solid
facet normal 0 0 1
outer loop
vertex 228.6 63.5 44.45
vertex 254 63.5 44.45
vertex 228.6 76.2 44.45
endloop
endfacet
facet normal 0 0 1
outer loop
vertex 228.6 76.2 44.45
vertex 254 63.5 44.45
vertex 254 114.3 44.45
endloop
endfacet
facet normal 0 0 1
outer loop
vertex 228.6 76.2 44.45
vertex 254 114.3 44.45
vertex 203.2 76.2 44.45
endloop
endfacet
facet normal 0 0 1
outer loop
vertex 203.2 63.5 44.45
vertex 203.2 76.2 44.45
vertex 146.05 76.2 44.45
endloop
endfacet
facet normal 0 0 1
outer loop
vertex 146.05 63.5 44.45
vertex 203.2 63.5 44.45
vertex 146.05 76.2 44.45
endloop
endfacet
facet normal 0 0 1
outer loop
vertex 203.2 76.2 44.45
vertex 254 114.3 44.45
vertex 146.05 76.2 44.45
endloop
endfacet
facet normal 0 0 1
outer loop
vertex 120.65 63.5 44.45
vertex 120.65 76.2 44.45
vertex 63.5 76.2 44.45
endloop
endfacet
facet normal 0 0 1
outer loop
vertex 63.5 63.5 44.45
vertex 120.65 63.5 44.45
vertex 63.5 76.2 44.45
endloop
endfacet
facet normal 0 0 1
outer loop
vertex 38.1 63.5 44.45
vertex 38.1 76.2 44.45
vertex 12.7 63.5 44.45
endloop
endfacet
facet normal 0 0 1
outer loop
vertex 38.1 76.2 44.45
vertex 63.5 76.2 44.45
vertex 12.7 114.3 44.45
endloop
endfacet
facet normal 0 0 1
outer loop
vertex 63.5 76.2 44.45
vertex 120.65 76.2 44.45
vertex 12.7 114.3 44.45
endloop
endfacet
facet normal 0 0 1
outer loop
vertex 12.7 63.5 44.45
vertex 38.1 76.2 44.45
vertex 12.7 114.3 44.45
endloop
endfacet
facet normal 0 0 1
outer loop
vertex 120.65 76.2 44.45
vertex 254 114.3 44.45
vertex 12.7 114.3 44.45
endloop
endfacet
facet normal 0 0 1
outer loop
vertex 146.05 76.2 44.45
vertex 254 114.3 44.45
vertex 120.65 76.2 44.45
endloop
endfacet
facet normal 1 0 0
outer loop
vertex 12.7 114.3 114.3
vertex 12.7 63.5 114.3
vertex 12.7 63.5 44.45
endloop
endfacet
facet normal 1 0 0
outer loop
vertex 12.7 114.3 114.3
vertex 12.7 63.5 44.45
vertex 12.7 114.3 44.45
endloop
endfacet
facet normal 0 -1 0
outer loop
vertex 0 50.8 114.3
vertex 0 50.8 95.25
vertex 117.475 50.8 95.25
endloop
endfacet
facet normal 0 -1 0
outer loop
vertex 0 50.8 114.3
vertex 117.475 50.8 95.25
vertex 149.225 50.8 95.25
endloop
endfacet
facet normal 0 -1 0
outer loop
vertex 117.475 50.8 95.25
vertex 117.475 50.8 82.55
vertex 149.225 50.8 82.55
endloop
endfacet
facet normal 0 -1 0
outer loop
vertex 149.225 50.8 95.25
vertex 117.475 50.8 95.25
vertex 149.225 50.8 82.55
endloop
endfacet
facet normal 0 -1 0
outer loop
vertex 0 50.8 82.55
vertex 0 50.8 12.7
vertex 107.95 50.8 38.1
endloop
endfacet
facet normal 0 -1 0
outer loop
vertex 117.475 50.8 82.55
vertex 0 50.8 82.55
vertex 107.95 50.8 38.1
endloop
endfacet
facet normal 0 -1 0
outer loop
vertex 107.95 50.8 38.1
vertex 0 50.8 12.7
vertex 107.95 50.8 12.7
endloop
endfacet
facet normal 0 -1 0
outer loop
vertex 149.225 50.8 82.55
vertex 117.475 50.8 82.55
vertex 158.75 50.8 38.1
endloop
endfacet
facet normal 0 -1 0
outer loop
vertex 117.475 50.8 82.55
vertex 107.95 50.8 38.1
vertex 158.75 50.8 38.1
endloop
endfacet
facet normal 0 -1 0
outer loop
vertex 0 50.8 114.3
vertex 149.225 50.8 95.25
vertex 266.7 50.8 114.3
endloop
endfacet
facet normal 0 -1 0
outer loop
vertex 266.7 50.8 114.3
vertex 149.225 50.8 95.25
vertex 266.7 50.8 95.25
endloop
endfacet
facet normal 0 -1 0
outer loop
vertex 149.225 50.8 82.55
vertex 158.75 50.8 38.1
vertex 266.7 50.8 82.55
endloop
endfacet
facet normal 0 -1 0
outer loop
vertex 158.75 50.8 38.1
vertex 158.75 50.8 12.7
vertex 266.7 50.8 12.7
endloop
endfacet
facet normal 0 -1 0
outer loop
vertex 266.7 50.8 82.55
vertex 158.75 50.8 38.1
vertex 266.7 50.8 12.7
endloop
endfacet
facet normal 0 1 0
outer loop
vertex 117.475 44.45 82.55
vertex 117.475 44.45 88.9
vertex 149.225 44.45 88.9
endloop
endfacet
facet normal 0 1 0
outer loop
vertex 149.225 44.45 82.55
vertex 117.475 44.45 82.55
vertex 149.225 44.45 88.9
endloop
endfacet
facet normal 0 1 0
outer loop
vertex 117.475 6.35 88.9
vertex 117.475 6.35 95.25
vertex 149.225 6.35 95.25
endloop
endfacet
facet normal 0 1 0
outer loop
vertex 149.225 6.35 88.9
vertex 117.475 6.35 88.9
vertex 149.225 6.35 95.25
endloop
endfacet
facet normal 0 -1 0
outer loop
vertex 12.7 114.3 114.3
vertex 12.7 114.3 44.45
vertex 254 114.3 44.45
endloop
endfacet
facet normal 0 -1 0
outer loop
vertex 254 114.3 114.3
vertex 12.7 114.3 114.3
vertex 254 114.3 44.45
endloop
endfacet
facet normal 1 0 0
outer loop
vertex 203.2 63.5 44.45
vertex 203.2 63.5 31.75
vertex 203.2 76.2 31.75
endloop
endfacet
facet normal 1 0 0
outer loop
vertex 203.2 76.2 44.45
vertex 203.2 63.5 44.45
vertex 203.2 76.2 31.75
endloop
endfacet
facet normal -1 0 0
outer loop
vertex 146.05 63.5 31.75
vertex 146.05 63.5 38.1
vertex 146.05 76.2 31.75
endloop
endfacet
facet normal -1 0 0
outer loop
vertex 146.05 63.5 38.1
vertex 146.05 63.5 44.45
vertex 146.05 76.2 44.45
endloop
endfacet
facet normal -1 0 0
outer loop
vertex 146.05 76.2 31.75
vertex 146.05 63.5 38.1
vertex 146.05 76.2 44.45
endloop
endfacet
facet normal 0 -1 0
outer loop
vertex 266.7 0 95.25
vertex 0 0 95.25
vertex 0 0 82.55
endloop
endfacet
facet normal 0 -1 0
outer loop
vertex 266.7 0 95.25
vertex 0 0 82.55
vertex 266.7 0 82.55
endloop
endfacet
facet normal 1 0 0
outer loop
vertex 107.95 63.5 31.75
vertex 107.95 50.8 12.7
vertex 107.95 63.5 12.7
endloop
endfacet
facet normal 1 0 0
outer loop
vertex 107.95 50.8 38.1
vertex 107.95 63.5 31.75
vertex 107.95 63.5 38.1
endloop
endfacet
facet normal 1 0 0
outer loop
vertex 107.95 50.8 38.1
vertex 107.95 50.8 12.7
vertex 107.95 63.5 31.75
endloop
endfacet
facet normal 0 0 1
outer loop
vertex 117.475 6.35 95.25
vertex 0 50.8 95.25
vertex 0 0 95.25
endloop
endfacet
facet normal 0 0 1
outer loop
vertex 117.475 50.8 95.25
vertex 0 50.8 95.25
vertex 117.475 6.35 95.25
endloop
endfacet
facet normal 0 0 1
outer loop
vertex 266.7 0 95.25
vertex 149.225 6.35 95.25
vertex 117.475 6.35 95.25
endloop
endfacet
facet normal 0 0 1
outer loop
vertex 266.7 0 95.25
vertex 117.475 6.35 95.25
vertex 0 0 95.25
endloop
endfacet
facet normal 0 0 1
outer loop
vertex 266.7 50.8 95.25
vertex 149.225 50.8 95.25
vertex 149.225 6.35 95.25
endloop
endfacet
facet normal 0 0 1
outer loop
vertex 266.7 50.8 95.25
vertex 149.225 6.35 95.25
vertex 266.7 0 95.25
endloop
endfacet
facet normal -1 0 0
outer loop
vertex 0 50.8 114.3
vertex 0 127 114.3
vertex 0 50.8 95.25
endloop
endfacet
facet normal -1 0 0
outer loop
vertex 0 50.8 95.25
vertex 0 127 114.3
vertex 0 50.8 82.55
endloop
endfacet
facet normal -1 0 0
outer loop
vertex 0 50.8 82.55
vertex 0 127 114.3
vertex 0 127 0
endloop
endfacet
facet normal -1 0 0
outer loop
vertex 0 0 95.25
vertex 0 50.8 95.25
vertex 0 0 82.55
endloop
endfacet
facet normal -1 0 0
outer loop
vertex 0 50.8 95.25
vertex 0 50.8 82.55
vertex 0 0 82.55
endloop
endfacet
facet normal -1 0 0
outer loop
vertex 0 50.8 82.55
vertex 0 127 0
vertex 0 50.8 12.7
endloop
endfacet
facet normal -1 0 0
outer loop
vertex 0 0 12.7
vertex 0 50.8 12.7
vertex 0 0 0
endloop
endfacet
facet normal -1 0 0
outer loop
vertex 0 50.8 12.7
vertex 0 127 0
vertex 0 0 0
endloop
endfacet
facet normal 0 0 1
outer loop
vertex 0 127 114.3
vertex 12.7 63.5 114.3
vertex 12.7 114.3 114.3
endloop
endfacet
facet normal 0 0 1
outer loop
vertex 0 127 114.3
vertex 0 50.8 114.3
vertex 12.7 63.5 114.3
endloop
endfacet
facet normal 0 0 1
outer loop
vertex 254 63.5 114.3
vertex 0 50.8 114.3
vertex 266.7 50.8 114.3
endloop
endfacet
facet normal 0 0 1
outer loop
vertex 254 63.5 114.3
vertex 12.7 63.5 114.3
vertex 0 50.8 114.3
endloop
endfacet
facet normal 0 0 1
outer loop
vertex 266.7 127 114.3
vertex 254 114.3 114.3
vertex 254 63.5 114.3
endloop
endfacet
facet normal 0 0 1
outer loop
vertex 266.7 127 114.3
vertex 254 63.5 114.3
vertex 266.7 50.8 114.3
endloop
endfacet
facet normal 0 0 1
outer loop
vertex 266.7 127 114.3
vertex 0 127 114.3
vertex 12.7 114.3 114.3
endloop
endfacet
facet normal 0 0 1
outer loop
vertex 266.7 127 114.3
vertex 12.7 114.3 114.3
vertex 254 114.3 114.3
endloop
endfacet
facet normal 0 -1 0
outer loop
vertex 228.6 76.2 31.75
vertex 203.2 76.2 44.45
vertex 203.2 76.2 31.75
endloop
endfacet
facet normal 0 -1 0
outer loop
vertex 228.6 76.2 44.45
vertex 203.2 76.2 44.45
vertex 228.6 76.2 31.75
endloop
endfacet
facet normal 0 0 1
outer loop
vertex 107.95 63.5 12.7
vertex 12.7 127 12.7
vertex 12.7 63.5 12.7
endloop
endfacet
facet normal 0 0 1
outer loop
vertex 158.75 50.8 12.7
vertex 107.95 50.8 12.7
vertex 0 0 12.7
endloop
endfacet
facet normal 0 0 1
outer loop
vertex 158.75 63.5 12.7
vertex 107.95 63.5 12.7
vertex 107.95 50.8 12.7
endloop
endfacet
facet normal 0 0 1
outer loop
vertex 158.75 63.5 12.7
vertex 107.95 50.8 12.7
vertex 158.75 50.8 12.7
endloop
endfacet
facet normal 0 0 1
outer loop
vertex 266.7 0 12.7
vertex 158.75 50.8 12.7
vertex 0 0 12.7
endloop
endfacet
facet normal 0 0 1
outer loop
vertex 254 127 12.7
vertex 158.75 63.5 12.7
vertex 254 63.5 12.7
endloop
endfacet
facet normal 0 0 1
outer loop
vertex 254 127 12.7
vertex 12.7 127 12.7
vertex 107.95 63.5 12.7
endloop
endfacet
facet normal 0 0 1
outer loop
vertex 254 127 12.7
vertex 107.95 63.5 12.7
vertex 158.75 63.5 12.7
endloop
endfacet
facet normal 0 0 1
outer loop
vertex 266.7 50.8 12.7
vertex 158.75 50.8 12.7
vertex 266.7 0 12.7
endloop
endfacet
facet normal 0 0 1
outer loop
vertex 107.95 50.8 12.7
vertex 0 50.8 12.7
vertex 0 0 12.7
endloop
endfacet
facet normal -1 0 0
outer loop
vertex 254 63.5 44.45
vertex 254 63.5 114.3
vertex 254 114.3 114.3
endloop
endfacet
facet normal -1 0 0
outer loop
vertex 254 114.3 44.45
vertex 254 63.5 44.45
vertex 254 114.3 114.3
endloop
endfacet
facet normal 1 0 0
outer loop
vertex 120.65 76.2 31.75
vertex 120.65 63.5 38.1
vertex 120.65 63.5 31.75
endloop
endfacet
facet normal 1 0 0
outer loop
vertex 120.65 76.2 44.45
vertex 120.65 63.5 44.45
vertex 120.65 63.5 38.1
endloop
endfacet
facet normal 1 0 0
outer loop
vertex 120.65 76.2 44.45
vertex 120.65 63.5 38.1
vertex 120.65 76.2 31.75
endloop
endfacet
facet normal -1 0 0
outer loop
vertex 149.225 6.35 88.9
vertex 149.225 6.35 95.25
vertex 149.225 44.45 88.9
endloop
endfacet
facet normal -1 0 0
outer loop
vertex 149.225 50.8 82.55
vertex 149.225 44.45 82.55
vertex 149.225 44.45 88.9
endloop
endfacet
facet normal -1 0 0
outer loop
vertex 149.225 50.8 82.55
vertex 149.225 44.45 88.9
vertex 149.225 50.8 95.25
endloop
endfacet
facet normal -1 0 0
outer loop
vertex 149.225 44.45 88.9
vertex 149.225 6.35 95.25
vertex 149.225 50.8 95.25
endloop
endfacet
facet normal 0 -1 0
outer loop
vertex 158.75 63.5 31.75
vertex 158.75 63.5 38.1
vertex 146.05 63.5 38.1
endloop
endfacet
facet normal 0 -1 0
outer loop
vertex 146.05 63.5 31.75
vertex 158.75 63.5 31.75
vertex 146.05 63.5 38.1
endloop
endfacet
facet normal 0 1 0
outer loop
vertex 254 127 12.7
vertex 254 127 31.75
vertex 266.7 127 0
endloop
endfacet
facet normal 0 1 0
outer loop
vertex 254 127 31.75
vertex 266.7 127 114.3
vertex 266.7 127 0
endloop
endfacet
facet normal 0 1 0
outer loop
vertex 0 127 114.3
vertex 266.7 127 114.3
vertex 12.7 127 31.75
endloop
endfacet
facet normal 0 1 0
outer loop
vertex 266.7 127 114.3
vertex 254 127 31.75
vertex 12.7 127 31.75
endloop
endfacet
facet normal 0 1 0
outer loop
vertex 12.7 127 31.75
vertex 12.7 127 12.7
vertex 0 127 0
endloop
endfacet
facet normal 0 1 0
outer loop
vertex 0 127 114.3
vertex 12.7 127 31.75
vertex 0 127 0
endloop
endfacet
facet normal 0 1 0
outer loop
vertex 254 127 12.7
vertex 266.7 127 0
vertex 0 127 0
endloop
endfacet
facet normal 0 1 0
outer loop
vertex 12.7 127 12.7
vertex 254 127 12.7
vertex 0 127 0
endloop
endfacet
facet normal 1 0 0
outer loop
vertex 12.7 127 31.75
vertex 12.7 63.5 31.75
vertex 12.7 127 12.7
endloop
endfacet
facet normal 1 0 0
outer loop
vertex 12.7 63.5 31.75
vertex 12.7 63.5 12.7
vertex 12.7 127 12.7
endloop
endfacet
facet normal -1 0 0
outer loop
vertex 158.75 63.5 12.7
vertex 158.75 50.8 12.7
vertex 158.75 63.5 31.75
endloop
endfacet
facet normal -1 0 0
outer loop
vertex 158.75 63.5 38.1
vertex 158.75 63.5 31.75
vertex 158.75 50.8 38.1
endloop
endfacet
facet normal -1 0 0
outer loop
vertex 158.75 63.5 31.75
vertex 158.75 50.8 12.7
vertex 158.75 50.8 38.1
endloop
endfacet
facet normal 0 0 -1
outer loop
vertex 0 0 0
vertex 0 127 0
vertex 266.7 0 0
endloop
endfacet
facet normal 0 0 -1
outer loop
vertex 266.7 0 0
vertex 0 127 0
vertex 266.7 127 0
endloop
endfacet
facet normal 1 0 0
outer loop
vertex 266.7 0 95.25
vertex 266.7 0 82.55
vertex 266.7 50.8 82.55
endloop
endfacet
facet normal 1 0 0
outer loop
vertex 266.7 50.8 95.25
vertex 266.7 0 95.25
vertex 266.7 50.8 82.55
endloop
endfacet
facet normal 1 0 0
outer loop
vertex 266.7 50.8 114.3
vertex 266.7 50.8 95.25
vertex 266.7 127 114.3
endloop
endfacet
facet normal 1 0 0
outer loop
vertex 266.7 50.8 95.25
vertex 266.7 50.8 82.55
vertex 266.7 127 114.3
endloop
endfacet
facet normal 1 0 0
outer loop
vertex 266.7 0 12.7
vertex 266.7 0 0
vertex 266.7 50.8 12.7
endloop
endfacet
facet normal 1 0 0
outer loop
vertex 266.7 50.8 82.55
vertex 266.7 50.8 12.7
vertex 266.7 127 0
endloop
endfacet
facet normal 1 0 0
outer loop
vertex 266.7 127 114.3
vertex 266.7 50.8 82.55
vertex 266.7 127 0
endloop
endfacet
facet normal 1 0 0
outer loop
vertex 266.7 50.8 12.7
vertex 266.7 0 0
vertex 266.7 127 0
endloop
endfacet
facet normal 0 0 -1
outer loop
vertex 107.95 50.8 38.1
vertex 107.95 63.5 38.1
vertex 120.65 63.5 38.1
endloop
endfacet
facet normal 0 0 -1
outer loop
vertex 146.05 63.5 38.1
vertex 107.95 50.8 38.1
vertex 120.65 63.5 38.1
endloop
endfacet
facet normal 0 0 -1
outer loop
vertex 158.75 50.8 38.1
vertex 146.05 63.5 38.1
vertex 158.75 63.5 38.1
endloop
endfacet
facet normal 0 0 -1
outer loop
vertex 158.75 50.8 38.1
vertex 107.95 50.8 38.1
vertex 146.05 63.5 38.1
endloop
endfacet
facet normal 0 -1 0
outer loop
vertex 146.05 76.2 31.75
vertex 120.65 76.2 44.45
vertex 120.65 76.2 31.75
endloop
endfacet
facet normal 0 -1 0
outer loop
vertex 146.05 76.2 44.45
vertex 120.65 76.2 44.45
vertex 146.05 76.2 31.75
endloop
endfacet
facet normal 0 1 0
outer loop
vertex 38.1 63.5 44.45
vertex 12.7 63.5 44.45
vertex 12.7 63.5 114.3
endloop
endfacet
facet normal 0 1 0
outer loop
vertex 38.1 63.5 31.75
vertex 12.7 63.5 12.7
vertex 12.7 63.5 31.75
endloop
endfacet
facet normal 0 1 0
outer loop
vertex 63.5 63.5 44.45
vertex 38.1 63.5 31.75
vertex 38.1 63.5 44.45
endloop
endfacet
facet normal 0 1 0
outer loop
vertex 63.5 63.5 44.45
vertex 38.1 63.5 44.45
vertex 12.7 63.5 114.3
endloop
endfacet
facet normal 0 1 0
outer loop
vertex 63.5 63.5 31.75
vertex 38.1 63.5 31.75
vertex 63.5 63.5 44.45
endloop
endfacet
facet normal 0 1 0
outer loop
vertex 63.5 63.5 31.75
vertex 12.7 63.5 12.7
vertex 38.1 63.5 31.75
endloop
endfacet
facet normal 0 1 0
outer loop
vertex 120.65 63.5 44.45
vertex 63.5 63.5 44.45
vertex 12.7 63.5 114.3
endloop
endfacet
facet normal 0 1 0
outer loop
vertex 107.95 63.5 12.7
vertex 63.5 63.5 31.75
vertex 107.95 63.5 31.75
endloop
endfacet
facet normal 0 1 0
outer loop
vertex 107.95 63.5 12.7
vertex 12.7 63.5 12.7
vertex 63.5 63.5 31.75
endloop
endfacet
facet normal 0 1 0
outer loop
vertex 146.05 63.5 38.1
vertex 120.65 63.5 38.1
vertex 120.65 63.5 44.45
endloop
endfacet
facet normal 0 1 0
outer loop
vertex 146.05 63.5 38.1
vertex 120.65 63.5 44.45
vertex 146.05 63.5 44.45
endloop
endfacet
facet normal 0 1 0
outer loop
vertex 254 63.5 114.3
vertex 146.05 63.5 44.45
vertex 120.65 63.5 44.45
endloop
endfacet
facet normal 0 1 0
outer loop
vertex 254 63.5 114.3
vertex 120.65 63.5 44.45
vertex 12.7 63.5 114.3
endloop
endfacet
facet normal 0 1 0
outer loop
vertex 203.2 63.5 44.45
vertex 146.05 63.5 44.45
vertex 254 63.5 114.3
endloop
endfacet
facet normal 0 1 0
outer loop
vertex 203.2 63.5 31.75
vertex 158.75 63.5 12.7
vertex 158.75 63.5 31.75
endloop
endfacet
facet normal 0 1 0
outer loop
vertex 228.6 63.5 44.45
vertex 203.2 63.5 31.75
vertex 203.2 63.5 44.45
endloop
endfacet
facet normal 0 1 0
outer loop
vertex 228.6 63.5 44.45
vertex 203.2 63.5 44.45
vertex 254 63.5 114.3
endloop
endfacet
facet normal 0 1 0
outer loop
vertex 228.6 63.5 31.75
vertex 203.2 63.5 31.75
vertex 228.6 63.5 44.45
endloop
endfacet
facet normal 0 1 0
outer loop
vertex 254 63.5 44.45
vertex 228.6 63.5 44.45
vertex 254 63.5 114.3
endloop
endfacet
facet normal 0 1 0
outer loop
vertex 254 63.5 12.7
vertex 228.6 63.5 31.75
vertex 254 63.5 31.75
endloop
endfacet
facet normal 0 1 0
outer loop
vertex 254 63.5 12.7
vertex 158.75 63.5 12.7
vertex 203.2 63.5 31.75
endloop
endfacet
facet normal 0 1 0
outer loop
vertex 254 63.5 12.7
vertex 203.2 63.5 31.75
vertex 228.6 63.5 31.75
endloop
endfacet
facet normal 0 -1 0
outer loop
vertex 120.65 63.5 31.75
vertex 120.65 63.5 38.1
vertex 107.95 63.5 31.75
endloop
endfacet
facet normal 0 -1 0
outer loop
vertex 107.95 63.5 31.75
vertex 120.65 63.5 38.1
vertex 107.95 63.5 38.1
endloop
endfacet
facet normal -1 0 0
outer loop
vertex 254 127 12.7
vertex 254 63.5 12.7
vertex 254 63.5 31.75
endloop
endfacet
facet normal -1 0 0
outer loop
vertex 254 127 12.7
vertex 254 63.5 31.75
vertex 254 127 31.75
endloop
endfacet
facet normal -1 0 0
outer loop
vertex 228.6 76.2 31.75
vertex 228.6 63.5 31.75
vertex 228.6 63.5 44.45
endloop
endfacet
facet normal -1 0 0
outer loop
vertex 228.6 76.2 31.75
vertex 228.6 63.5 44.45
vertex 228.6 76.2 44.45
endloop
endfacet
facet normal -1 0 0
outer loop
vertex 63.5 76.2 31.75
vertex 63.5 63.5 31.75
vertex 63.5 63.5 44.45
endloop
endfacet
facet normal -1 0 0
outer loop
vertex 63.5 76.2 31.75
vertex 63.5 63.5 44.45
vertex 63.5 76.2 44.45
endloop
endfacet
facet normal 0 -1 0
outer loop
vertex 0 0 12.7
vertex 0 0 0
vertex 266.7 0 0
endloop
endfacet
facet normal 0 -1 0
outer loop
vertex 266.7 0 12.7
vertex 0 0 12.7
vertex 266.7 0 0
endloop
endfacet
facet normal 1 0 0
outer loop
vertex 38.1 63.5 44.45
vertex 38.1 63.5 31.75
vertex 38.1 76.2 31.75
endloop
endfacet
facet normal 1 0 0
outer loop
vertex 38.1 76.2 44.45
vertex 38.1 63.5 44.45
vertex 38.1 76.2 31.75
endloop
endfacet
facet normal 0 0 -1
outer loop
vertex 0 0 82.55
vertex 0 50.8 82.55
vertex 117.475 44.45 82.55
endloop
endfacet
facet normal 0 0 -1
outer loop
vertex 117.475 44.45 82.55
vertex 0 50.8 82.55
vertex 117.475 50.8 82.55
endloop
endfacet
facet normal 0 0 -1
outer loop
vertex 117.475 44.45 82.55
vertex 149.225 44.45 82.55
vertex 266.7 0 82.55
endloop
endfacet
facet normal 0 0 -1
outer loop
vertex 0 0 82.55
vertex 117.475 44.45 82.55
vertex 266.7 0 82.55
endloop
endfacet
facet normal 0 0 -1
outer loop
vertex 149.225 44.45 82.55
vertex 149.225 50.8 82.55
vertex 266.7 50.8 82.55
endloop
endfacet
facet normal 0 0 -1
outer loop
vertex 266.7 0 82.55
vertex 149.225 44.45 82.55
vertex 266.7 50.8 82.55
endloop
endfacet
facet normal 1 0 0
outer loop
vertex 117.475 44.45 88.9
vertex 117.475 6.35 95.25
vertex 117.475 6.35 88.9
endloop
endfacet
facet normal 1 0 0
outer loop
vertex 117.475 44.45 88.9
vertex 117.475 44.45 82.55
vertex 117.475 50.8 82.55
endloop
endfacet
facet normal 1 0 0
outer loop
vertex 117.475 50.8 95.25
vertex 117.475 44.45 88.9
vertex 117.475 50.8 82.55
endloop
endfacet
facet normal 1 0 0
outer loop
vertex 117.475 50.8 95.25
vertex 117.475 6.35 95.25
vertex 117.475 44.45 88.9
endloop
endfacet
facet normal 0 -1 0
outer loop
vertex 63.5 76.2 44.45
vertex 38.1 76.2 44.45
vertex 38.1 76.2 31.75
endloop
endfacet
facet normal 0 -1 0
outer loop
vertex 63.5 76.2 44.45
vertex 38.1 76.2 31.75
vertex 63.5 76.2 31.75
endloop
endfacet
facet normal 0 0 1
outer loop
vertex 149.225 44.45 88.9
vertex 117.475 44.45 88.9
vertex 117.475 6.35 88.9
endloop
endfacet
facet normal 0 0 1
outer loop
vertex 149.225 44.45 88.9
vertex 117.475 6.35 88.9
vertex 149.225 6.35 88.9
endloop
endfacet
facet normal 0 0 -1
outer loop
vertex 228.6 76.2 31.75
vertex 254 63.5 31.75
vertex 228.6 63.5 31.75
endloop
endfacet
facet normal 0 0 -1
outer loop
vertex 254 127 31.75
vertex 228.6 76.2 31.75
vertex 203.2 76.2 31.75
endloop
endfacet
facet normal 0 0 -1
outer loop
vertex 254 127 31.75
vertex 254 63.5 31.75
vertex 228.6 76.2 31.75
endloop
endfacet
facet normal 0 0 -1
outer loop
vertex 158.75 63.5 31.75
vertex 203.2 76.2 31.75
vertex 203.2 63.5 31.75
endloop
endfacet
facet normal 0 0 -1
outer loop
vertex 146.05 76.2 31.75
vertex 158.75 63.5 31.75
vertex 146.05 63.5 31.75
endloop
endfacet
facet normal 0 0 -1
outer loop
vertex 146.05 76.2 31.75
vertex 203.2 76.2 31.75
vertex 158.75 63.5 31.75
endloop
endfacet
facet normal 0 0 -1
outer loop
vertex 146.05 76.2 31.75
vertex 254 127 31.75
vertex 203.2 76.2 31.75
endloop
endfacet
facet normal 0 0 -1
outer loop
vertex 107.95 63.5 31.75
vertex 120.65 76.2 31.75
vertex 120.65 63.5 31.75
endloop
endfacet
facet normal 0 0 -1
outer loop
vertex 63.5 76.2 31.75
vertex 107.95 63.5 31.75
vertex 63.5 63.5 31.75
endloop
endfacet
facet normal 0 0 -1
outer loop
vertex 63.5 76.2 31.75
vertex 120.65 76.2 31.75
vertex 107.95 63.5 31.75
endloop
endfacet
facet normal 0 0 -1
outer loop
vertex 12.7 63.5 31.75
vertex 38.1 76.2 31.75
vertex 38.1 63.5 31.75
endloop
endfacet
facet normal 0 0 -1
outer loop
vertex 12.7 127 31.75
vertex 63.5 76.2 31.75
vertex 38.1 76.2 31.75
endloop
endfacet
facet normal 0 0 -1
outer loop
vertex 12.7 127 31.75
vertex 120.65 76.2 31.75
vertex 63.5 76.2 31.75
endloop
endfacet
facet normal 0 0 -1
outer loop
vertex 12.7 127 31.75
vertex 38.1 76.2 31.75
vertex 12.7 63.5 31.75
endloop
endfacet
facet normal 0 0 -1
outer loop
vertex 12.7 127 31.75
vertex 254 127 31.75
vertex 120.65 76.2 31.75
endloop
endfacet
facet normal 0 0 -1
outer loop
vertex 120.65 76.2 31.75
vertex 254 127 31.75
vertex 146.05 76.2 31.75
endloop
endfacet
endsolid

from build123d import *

# Parameters (mm, degrees)
F0_W      = 266.7
F0_H      = 127
F1_DEPTH  = 12.7
F2_W      = 241.3
F2_H      = 50.8
F3_DEPTH  = 101.6
F4_W      = 266.7
F4_H      = 12.7
F5_DEPTH  = 50.8
F6_W      = 241.3
F6_H      = 19.05
F7_DEPTH  = 63.5
F8_W      = 50.8
F8_H      = 25.4
F9_DEPTH  = 63.5
F10_W     = 31.75
F10_H     = 44.45
F11_DEPTH = 6.35
F12_W     = 241.3
F12_H     = 12.7
F13_DEPTH = 63.5
F14_W     = 31.75
F14_H     = 6.35
F15_DEPTH = 6.35
F16_W     = 25.4
F16_H     = 12.7
F17_DEPTH = 12.7


with BuildPart() as f1:
    # F0 (on Top) → F1 (new body)
    with BuildSketch(Plane.XY):
        with Locations((133.35, 63.5)):
            Rectangle(F0_W, F0_H)
    extrude(amount=F1_DEPTH)

    # F2 (on face) → F3 (join)
    with BuildSketch(Plane.XY.offset(12.7)):
        Polygon((0, 63.5), (0, 50.8), (266.7, 50.8), (266.7, 63.5), (266.7, 114.3), (266.7, 127), (0, 127), (0, 114.3), align=None)
        with Locations((133.35, 88.9)):
            Rectangle(F2_W, F2_H, mode=Mode.SUBTRACT)
    extrude(amount=F3_DEPTH)

    # F4 (on face) → F5 (join, through all)
    with BuildSketch(Plane.XZ.offset(-50.8)):
        with Locations((133.35, 88.9)):
            Rectangle(F4_W, F4_H)
    extrude(amount=F5_DEPTH)

    # F6 (on face) → F7 (cut, through all)
    with BuildSketch(Plane(origin=(0, 127, 0), x_dir=(-1, 0, 0), z_dir=(0, 1, 0))):
        with Locations((-133.35, 22.225)):
            Rectangle(F6_W, F6_H)
    extrude(amount=-F7_DEPTH, mode=Mode.SUBTRACT)

    # F8 (on face) → F9 (cut, through all)
    with BuildSketch(Plane.XZ.offset(-50.8)):
        with Locations((133.35, 25.4)):
            Rectangle(F8_W, F8_H)
    extrude(amount=-F9_DEPTH, mode=Mode.SUBTRACT)

    # F10 (on face) → F11 (cut)
    with BuildSketch(Plane.XY.offset(95.25)):
        with Locations((133.35, 28.575)):
            Rectangle(F10_W, F10_H)
    extrude(amount=-F11_DEPTH, mode=Mode.SUBTRACT)

    # F12 (on face) → F13 (join, through all)
    with BuildSketch(Plane(origin=(0, 127, 0), x_dir=(-1, 0, 0), z_dir=(0, 1, 0))):
        with Locations((-133.35, 38.1)):
            Rectangle(F12_W, F12_H)
    extrude(amount=-F13_DEPTH)

    # F14 (on face) → F15 (cut, through all)
    with BuildSketch(Plane.XY.offset(88.9)):
        with Locations((133.35, 47.625)):
            Rectangle(F14_W, F14_H)
    extrude(amount=-F15_DEPTH, mode=Mode.SUBTRACT)

    # F16 (on face) → F17 (cut, through all)
    with BuildSketch(Plane.XY.offset(44.45)):
        with Locations((215.9, 69.85)):
            Rectangle(F16_W, F16_H)
        with Locations((50.8, 69.85)):
            Rectangle(F16_W, F16_H)
        with Locations((133.35, 69.85)):
            Rectangle(F16_W, F16_H)
    extrude(amount=-F17_DEPTH, mode=Mode.SUBTRACT)


solid = f1.part
